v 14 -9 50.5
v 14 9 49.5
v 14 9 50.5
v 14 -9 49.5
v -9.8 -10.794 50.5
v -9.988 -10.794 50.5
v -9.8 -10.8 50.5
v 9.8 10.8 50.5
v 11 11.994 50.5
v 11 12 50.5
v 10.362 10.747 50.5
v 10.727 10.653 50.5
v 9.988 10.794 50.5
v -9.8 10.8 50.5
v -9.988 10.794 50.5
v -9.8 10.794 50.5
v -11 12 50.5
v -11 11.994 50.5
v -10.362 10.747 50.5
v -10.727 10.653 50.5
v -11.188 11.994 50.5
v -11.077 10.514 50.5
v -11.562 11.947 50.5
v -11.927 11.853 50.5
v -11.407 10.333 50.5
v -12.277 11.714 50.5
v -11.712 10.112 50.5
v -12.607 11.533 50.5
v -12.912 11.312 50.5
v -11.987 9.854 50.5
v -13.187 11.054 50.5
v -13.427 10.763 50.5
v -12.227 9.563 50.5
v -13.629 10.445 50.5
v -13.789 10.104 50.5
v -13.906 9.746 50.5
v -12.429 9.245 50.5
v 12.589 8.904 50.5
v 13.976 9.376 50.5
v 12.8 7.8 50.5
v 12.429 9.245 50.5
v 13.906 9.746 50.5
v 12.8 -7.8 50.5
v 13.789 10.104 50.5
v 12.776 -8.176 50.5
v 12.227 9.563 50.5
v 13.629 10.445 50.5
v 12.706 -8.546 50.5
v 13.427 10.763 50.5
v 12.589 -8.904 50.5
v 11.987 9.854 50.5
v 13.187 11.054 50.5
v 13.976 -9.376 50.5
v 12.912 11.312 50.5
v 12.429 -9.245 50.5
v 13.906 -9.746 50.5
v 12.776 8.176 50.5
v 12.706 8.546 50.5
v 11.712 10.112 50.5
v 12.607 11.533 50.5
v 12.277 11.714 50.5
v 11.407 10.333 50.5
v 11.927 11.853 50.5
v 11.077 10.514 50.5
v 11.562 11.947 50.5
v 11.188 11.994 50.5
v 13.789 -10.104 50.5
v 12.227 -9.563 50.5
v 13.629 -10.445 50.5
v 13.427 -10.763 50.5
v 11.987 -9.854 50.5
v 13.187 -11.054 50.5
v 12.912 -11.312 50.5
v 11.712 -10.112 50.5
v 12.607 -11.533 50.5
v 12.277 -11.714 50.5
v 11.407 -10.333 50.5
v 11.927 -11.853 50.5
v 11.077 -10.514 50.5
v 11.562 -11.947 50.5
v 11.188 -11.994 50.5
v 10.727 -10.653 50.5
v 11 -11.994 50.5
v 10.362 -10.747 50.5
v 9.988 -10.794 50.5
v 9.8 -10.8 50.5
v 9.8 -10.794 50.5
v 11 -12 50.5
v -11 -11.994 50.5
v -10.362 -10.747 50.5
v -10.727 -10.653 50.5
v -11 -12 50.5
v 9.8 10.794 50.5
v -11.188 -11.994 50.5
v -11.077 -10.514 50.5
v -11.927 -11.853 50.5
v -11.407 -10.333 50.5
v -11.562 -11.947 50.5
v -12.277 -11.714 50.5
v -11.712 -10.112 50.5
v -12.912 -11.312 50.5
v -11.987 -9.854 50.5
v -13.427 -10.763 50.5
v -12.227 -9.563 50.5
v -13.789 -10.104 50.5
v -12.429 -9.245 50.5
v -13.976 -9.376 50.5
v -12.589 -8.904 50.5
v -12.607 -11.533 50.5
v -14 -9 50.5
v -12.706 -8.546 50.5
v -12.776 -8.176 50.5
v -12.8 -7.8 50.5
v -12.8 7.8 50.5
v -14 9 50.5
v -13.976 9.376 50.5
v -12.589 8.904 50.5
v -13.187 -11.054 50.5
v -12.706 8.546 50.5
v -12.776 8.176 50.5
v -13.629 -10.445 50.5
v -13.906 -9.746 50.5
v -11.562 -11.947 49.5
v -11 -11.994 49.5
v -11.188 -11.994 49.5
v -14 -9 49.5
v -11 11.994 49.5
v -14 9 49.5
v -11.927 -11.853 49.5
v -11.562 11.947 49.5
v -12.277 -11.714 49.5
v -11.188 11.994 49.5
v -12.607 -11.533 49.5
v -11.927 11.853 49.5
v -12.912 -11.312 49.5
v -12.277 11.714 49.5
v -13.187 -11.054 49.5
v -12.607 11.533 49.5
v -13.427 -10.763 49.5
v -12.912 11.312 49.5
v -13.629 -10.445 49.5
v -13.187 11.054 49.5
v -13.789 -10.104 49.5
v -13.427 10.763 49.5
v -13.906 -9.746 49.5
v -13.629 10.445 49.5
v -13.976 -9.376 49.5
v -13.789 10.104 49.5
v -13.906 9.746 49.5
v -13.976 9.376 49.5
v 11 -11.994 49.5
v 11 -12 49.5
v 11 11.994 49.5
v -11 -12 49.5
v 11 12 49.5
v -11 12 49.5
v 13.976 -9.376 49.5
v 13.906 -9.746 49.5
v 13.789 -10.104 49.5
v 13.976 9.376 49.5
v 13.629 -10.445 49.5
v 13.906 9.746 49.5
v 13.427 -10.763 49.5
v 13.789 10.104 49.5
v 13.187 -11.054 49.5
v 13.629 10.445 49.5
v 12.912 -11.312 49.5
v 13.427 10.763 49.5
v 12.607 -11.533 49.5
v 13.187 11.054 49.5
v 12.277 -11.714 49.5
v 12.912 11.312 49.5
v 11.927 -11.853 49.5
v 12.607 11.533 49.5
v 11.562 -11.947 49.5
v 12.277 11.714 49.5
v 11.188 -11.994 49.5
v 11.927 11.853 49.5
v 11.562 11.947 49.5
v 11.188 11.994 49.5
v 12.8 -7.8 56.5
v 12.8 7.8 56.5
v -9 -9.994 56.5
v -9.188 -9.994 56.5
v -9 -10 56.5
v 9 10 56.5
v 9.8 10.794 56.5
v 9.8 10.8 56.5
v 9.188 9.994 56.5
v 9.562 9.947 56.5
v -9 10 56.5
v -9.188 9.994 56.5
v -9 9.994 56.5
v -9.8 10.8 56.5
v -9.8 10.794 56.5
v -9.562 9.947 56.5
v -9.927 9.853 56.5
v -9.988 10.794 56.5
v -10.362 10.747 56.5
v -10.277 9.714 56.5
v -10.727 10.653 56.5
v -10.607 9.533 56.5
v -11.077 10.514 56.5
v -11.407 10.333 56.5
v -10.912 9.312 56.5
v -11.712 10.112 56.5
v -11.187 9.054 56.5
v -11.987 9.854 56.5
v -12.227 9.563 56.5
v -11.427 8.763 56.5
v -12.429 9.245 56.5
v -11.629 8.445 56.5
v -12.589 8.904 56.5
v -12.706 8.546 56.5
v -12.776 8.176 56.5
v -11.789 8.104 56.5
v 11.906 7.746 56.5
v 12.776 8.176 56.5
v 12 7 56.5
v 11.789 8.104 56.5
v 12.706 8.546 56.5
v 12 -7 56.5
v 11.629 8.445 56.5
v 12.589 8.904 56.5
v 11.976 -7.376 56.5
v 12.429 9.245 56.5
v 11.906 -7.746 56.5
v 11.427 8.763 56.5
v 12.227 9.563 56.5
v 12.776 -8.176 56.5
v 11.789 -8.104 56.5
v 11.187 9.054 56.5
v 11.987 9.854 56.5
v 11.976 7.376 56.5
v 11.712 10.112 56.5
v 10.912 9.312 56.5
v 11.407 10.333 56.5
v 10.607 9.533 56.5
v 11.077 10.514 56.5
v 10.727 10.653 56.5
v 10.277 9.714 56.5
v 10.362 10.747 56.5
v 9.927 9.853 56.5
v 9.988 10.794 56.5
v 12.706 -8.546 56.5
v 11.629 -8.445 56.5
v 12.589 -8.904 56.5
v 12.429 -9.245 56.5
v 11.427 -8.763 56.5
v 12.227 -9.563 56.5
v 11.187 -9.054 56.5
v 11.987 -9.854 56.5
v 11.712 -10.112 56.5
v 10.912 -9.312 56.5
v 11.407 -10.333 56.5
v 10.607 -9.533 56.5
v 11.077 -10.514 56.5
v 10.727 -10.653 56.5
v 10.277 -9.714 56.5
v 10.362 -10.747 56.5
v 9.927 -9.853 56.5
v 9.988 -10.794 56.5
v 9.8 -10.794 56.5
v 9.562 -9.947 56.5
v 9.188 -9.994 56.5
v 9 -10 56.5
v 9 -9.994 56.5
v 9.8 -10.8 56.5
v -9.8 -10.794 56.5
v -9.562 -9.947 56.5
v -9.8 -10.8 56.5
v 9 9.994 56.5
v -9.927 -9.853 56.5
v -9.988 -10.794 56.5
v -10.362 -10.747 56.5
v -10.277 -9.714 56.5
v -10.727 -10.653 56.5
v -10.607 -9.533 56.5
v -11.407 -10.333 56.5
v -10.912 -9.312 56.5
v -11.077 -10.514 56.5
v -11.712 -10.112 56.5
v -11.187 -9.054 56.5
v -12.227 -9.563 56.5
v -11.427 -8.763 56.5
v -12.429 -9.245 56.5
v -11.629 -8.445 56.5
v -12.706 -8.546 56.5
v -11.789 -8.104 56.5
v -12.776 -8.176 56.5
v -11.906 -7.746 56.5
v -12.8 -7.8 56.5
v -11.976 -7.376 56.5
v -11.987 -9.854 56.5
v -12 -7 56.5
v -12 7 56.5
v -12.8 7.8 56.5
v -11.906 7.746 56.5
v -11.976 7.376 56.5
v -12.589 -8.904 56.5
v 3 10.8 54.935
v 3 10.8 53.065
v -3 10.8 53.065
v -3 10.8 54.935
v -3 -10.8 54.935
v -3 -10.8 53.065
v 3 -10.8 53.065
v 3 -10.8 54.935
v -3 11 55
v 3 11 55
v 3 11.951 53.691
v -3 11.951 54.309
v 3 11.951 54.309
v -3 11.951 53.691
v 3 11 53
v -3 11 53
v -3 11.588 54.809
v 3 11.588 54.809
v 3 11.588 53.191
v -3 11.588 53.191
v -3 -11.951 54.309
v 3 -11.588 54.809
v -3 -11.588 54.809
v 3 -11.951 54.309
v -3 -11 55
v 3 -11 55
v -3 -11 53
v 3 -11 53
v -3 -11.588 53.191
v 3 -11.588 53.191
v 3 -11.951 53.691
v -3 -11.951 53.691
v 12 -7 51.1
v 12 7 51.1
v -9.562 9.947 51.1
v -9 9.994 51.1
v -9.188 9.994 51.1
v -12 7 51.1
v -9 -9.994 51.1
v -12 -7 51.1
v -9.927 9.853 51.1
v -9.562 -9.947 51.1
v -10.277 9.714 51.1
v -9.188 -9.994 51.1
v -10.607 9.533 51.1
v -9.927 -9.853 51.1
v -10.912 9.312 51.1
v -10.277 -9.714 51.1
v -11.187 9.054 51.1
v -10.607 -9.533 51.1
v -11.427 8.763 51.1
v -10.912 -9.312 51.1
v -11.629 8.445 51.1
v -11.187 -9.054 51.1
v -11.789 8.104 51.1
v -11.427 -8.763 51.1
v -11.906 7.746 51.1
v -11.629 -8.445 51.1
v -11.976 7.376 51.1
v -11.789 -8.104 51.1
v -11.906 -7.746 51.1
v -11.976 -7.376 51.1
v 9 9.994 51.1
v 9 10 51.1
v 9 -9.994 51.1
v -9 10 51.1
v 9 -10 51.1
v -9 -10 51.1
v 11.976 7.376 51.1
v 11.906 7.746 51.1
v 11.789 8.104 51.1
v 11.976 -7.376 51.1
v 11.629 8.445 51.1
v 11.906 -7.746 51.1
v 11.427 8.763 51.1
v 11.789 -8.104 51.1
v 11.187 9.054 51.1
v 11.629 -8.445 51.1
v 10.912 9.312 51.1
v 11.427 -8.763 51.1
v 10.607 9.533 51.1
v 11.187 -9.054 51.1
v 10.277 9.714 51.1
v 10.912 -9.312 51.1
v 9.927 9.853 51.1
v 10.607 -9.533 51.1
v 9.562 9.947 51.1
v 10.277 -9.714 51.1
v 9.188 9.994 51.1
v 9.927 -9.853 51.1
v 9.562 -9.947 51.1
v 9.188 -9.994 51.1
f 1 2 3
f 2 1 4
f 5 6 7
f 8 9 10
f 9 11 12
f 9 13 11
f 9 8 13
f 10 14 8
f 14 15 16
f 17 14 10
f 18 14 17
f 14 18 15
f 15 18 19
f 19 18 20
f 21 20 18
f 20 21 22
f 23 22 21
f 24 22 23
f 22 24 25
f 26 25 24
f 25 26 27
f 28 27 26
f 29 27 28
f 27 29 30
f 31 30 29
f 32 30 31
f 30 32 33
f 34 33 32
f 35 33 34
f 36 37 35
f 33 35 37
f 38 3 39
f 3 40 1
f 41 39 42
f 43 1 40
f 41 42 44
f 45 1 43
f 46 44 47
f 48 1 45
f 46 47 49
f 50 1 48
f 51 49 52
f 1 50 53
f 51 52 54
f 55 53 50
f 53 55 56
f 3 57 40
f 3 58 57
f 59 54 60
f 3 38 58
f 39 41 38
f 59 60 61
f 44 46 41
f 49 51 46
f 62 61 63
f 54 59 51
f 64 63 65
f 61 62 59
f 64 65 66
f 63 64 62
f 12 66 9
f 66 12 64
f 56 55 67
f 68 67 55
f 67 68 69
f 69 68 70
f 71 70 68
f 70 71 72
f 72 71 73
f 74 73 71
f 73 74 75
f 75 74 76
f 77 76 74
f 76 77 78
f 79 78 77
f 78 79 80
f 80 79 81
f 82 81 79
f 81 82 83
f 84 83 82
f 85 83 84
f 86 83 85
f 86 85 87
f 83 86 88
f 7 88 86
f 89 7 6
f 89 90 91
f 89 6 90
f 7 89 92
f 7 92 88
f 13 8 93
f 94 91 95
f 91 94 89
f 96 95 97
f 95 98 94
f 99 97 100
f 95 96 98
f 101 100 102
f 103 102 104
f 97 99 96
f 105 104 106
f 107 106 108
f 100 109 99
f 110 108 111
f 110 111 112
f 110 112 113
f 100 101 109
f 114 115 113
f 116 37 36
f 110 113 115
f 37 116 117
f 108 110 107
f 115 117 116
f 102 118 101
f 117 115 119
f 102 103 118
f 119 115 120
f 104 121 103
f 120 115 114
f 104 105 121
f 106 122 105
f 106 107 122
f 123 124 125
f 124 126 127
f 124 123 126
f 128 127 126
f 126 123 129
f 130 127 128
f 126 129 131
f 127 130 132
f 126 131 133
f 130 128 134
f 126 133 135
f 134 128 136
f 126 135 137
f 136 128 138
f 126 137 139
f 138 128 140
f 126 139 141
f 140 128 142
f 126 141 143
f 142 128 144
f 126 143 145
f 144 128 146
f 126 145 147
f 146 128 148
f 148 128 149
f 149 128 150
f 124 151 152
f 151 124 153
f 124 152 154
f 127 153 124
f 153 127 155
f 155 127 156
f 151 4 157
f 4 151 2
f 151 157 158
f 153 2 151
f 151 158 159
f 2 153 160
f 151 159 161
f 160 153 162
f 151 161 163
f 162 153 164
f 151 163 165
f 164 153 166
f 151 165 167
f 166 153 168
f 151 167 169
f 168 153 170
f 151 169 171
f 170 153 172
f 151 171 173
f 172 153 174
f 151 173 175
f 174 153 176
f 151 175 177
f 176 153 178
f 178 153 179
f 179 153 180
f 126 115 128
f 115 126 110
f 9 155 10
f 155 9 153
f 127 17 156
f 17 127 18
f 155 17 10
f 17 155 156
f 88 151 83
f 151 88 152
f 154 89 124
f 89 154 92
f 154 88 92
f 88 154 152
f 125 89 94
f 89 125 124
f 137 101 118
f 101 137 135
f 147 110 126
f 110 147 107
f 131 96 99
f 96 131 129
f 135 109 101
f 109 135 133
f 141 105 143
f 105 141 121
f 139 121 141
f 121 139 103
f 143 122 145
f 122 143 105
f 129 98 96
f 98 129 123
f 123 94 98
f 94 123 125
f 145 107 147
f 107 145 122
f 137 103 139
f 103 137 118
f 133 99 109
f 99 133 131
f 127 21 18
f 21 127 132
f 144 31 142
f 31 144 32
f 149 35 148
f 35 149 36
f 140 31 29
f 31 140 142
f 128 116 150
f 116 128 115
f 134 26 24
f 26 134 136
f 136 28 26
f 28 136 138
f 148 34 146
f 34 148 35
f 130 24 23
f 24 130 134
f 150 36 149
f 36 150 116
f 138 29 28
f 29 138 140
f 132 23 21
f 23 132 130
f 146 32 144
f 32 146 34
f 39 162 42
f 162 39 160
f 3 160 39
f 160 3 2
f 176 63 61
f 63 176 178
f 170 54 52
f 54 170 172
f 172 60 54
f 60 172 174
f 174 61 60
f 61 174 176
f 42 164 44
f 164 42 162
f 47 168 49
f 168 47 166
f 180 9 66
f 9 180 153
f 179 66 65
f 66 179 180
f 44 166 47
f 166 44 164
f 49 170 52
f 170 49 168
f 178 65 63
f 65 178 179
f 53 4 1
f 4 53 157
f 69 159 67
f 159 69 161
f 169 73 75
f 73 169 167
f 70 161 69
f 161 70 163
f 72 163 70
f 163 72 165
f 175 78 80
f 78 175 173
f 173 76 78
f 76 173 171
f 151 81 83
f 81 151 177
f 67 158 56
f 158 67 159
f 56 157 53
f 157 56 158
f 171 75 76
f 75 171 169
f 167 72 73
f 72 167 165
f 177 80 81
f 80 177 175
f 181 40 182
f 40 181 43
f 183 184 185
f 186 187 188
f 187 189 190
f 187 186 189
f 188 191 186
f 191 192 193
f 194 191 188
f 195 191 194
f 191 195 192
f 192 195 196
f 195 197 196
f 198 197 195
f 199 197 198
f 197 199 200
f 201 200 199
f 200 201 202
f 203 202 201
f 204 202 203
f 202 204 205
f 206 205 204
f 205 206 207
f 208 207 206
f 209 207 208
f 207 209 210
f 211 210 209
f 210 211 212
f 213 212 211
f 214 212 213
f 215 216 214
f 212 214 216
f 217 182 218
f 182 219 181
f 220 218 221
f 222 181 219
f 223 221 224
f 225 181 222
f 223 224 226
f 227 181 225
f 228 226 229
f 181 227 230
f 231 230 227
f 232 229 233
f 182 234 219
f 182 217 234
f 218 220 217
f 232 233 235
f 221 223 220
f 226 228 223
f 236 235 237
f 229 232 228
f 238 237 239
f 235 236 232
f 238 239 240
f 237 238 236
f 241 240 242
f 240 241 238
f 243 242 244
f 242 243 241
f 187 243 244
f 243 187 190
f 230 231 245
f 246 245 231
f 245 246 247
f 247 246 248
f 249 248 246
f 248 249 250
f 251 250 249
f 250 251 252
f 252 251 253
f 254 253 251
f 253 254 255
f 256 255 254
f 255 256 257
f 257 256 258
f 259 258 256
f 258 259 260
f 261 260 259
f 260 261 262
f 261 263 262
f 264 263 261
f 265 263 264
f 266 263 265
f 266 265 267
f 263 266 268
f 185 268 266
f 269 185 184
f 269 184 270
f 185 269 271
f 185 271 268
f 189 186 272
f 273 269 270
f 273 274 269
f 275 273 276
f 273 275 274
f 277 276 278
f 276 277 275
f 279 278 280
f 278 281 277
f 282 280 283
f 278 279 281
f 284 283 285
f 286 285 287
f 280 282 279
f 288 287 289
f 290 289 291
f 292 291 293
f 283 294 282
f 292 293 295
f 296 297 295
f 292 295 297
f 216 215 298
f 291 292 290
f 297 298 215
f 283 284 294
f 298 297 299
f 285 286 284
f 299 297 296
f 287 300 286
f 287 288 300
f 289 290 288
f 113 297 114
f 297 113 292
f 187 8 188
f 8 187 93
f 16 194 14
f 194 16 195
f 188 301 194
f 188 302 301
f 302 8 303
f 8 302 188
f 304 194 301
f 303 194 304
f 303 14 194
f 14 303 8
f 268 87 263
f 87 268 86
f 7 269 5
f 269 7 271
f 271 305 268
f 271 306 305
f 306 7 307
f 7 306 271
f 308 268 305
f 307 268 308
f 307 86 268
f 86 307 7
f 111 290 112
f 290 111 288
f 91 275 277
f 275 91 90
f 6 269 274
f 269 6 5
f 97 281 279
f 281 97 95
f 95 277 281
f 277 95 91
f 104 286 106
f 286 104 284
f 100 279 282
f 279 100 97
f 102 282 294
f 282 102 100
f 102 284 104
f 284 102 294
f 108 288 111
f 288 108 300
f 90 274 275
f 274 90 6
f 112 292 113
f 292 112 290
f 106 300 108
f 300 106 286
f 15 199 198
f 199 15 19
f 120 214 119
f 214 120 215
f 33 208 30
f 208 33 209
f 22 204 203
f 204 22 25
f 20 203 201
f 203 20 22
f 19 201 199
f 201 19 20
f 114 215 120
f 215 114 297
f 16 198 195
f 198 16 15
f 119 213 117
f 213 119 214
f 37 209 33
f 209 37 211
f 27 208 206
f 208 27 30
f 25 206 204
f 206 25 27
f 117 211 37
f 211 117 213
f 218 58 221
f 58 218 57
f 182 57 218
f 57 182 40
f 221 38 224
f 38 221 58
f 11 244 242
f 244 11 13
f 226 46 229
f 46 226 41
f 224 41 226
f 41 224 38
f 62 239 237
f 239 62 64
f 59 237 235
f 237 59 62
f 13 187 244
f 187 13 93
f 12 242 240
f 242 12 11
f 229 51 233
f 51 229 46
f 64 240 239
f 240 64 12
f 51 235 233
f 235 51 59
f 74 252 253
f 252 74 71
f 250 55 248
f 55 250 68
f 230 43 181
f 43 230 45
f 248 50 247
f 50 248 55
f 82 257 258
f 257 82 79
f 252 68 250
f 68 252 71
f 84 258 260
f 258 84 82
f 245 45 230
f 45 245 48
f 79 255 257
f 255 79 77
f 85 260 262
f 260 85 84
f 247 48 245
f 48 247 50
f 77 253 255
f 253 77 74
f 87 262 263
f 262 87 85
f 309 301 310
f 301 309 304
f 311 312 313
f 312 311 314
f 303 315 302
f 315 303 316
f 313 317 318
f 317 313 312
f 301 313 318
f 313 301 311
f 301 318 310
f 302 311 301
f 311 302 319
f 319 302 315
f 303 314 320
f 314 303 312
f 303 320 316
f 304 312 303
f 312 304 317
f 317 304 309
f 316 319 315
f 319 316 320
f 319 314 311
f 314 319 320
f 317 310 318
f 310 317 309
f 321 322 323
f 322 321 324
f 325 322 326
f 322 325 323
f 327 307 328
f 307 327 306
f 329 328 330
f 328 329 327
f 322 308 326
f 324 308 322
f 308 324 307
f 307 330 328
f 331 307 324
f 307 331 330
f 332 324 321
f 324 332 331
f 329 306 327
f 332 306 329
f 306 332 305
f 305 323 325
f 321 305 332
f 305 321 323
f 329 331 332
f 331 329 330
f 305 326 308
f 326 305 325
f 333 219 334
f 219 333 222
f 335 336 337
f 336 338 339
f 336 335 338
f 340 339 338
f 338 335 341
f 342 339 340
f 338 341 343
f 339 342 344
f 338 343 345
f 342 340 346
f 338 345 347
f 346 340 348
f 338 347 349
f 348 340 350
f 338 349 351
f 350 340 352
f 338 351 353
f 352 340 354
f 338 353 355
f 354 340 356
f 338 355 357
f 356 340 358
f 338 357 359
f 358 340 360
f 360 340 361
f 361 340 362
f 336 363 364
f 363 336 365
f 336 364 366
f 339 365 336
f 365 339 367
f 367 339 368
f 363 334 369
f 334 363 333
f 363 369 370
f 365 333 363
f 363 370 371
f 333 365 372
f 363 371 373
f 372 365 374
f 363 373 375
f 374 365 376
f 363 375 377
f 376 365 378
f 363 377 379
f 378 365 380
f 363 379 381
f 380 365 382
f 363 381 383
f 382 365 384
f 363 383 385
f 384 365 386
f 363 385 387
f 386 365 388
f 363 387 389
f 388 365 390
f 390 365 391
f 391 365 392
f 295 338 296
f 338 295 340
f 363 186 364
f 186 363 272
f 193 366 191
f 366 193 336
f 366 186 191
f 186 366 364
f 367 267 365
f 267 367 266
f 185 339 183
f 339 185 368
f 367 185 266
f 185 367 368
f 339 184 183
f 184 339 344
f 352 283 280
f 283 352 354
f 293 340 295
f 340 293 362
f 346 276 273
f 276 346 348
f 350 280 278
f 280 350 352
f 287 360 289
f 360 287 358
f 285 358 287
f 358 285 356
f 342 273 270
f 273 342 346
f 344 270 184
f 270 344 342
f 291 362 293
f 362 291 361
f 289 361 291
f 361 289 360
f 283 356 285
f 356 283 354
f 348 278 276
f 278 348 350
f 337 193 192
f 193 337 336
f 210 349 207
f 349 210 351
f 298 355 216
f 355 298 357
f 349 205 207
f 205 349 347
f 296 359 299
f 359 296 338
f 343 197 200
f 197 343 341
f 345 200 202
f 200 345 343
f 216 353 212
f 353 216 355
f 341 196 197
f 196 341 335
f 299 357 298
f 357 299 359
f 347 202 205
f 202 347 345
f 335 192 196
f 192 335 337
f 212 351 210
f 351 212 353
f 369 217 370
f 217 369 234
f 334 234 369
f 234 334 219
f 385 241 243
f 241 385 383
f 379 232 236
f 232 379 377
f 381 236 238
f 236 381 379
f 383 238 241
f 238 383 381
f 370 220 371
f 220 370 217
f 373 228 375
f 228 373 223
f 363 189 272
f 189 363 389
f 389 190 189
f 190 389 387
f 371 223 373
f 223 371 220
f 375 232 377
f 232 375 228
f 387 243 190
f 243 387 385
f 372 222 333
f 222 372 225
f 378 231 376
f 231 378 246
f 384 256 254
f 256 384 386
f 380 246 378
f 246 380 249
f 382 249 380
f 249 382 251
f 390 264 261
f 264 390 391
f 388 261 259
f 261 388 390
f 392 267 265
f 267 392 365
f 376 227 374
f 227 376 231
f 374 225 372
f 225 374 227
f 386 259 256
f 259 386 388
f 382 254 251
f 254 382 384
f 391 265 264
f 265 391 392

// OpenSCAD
// esp32s3 eth poe
$c_p=5;

width = 24;
height = 28;
length = 80;
rad = 3;
th = 2;

ew=17;
eh=13.5;
el=16;

pw = 22;
pth = 2.5;
pl = 73;


translate([0,0,0+length-40+10])
    //mirror([0,0,1])
    endcap();
//lipstick();

// endcap
module endcap() {
    difference (){
        union() {
            //flat plate
            rounded_square(width, height, th/2, rad);
            // inside shape
            translate([0,0,0+th*1.5])
                rounded_square(width-th-.4, height-th-.4, th*3.5, rad);

            //bump for holding
            translate([0-3,0+width/2-th/2,0+th*2])
                rotate([0,90,0])
                    cylinder(6, 1, 1, $fn=10);
            translate([0-3,0-width/2+th/2,0+th*2])
                rotate([0,90,0])
                    cylinder(6, 1, 1, $fn=10);
            
        }
        translate([0,0,0+th*2.5+.1])
            rounded_square(width-th*2, height-th*2, th*4, rad);
        
    }
}

module lipstick() {
    union() {
        difference() {    
            union() {
                rounded_square(width, height, length, rad);


            }
            // hollow main
            translate([0,0,0+th+4])
                rounded_square(width-2, height-2, length, rad);
            // clear usbc connector
            translate([0+th*3.5,0,0-length/2+th*4-1])
                rounded_square(width-5, 12, 12, rad);
            
            // pcb
            translate([0+th*3,0,0-th-1])
                cube([pth, pw, pl], true);
            
            // ethernet jack
            translate([0-th,0,0+th-length/2])
                cube([eh, ew, el], true);
            
            // usb jack
            translate([0+th*4+.5,0,0-length/2-th])
                rounded_strut(6, 4, 10, 0);
            
            // rear clip holes
            translate([0,0-20,0+length/2-th*2])
                rotate([0,90,90])
                rounded_strut(6, 2, 50, 0);
            
        }

        // pcb
    //    translate([0+th*3,0,0-th-1])
    //        cube([pth, pw, pl], true);

        // rear pcb guide bump
        translate([0+th*1.5,0-width/2+th/2,0+length/2-th*6])
            rotate([90,0,90])
            rounded_strut(6, 2, 2, 0);
    //    // rear pcb guide bump
    //    translate([0+th*3.5,0-width/2+th/2,0+length/2-th*6])
    //        rotate([90,0,90])
    //        rounded_strut(6, 2, 2, 0);
        
    //    // rear pcb guide bump
    //    translate([0+th*1.5,0+width/2-th/2,0+length/2-th*6])
    //        rotate([90,0,90])
    //        rounded_strut(6, 2, 2, 0);
        // rear pcb guide bump
        translate([0+th*3.5,0+width/2-th/2,0+length/2-th*6])
            rotate([90,0,90])
            rounded_strut(6, 2, 2, 0);

    }
    
}


module rounded_strut($length, $width, $thickness, $hole_dia) {
    translate([0+$width/2,0,0+$thickness/2])
        difference(){
            union(){
                translate([0-$width/2,0+$length/2,0])
                    cylinder($thickness, $width/2, $width/2, $fn=$width*$c_p, true);
                translate([0-$width/2,0-$length/2,0])
                    cylinder($thickness, $width/2, $width/2, $fn=$width*$c_p, true);
                translate([0-$width/2,0,0])
                    cube([$width, $length,$thickness], true);
            }
            translate([0-$width/2,0+$length/2,0-0.1])
                cylinder($thickness+0.5, $hole_dia/2, $hole_dia/2, $fn=$hole_dia*$c_p, true);
            translate([0-$width/2,-$length/2,0-0.1])
                cylinder($thickness+0.5, $hole_dia/2, $hole_dia/2, $fn=$hole_dia*$c_p, true);

        }
}

module rounded_corner(rch, rcr, rth) {
    difference(){
        tube(rch, rcr, rcr, rcr-rth, rcr-rth, $fn=rcr*$c_p);
        translate([-1,0-rcr,-1])
            cube([rcr*2, rcr, rch*2]);
        
        translate([0-rcr,0-rcr,-1])
            cube([rcr, rcr*2, rch*2]);
    }
    translate([0+rcr/2-rth/2,0-rth/20,0])
        cube([rth/2, rth/20, rch]);
    translate([0-rth/20,0+rcr/2-rth/2,0])
        cube([rth/20, rth/2, rch]);
}


module rounded_square(ch_l, ch_w, ch_h, ch_c_rad) {
    // Square cross
    translate([0+ch_c_rad,0,0])
        cube([ch_w-ch_c_rad*2,ch_l-ch_c_rad*2,ch_h], true);
    translate([0-ch_c_rad,0,0])
        cube([ch_w-ch_c_rad*2,ch_l-ch_c_rad*2,ch_h], true);
    translate([0,0+ch_c_rad/2,0])
        cube([ch_w-ch_c_rad*2,ch_l-ch_c_rad,ch_h], true);
    translate([0,0-ch_c_rad/2,0])
        cube([ch_w-ch_c_rad*2,ch_l-ch_c_rad,ch_h], true);

    // Rounded corners
    translate([0-ch_w/2+ch_c_rad,0-ch_l/2+ch_c_rad,0])
        cylinder(ch_h, ch_c_rad, ch_c_rad, $fn=50, true);
    translate([0-ch_w/2+ch_c_rad,0+ch_l/2-ch_c_rad,0])
        cylinder(ch_h, ch_c_rad, ch_c_rad, $fn=50, true);
    translate([0+ch_w/2-ch_c_rad,0+ch_l/2-ch_c_rad,0])
        cylinder(ch_h, ch_c_rad, ch_c_rad, $fn=50, true);
    translate([0+ch_w/2-ch_c_rad,0-ch_l/2+ch_c_rad,0])
        cylinder(ch_h, ch_c_rad, ch_c_rad, $fn=50, true);
    
}


module profile_rounded_corners2 (cw, cl, ch, cth, cdia){
    // width, length, height, thickness, radius
    difference(){
        hull() {
            translate([0-cw/2+cdia/2,0-cl/2+cdia/2,0])
                cylinder(ch, cdia/2, cdia/2, $fn=cdia*$c_p, true);
            translate([0+cw/2-cdia/2,0+cl/2-cdia/2,0])
                cylinder(ch, cdia/2, cdia/2, $fn=cdia*$c_p, true);
            translate([0+cw/2-cdia/2,0-cl/2+cdia/2,0])
                cylinder(ch, cdia/2, cdia/2, $fn=cdia*$c_p, true);
            translate([0-cw/2+cdia/2,0+cl/2-cdia/2,0])
                cylinder(ch, cdia/2, cdia/2, $fn=cdia*$c_p, true);
        }
        hull() {
            translate([0-cw/2+cdia/2+cth*2,0-cl/2+cdia/2+cth*2,0])
                cylinder(ch, cdia/2, cdia/2, $fn=cdia*$c_p, true);
            translate([0+cw/2-cdia/2-cth*2,0+cl/2-cdia/2-cth*2,0])
                cylinder(ch, cdia/2, cdia/2, $fn=cdia*$c_p, true);
            translate([0+cw/2-cdia/2-cth*2,0-cl/2+cdia/2+cth*2,0])
                cylinder(ch, cdia/2, cdia/2, $fn=cdia*$c_p, true);
            translate([0-cw/2+cdia/2+cth*2,0+cl/2-cdia/2-cth*2,0])
                cylinder(ch, cdia/2, cdia/2, $fn=cdia*$c_p, true);
        }
    }    
}

module tube($height, $od, $od2, $id, $id2, $fn){
    difference(){
//        cylinder($height, $od/2, $od2/2, $fn=$od*$c_p);
        cylinder($height, $od/2, $od2/2, $fn=$fn);
        translate([0,0,-1])
//            cylinder($height+2, $id/2, $id2/2, $fn=$od*$c_p);
            cylinder($height+2, $id/2, $id2/2, $fn=$fn);
    }
}
